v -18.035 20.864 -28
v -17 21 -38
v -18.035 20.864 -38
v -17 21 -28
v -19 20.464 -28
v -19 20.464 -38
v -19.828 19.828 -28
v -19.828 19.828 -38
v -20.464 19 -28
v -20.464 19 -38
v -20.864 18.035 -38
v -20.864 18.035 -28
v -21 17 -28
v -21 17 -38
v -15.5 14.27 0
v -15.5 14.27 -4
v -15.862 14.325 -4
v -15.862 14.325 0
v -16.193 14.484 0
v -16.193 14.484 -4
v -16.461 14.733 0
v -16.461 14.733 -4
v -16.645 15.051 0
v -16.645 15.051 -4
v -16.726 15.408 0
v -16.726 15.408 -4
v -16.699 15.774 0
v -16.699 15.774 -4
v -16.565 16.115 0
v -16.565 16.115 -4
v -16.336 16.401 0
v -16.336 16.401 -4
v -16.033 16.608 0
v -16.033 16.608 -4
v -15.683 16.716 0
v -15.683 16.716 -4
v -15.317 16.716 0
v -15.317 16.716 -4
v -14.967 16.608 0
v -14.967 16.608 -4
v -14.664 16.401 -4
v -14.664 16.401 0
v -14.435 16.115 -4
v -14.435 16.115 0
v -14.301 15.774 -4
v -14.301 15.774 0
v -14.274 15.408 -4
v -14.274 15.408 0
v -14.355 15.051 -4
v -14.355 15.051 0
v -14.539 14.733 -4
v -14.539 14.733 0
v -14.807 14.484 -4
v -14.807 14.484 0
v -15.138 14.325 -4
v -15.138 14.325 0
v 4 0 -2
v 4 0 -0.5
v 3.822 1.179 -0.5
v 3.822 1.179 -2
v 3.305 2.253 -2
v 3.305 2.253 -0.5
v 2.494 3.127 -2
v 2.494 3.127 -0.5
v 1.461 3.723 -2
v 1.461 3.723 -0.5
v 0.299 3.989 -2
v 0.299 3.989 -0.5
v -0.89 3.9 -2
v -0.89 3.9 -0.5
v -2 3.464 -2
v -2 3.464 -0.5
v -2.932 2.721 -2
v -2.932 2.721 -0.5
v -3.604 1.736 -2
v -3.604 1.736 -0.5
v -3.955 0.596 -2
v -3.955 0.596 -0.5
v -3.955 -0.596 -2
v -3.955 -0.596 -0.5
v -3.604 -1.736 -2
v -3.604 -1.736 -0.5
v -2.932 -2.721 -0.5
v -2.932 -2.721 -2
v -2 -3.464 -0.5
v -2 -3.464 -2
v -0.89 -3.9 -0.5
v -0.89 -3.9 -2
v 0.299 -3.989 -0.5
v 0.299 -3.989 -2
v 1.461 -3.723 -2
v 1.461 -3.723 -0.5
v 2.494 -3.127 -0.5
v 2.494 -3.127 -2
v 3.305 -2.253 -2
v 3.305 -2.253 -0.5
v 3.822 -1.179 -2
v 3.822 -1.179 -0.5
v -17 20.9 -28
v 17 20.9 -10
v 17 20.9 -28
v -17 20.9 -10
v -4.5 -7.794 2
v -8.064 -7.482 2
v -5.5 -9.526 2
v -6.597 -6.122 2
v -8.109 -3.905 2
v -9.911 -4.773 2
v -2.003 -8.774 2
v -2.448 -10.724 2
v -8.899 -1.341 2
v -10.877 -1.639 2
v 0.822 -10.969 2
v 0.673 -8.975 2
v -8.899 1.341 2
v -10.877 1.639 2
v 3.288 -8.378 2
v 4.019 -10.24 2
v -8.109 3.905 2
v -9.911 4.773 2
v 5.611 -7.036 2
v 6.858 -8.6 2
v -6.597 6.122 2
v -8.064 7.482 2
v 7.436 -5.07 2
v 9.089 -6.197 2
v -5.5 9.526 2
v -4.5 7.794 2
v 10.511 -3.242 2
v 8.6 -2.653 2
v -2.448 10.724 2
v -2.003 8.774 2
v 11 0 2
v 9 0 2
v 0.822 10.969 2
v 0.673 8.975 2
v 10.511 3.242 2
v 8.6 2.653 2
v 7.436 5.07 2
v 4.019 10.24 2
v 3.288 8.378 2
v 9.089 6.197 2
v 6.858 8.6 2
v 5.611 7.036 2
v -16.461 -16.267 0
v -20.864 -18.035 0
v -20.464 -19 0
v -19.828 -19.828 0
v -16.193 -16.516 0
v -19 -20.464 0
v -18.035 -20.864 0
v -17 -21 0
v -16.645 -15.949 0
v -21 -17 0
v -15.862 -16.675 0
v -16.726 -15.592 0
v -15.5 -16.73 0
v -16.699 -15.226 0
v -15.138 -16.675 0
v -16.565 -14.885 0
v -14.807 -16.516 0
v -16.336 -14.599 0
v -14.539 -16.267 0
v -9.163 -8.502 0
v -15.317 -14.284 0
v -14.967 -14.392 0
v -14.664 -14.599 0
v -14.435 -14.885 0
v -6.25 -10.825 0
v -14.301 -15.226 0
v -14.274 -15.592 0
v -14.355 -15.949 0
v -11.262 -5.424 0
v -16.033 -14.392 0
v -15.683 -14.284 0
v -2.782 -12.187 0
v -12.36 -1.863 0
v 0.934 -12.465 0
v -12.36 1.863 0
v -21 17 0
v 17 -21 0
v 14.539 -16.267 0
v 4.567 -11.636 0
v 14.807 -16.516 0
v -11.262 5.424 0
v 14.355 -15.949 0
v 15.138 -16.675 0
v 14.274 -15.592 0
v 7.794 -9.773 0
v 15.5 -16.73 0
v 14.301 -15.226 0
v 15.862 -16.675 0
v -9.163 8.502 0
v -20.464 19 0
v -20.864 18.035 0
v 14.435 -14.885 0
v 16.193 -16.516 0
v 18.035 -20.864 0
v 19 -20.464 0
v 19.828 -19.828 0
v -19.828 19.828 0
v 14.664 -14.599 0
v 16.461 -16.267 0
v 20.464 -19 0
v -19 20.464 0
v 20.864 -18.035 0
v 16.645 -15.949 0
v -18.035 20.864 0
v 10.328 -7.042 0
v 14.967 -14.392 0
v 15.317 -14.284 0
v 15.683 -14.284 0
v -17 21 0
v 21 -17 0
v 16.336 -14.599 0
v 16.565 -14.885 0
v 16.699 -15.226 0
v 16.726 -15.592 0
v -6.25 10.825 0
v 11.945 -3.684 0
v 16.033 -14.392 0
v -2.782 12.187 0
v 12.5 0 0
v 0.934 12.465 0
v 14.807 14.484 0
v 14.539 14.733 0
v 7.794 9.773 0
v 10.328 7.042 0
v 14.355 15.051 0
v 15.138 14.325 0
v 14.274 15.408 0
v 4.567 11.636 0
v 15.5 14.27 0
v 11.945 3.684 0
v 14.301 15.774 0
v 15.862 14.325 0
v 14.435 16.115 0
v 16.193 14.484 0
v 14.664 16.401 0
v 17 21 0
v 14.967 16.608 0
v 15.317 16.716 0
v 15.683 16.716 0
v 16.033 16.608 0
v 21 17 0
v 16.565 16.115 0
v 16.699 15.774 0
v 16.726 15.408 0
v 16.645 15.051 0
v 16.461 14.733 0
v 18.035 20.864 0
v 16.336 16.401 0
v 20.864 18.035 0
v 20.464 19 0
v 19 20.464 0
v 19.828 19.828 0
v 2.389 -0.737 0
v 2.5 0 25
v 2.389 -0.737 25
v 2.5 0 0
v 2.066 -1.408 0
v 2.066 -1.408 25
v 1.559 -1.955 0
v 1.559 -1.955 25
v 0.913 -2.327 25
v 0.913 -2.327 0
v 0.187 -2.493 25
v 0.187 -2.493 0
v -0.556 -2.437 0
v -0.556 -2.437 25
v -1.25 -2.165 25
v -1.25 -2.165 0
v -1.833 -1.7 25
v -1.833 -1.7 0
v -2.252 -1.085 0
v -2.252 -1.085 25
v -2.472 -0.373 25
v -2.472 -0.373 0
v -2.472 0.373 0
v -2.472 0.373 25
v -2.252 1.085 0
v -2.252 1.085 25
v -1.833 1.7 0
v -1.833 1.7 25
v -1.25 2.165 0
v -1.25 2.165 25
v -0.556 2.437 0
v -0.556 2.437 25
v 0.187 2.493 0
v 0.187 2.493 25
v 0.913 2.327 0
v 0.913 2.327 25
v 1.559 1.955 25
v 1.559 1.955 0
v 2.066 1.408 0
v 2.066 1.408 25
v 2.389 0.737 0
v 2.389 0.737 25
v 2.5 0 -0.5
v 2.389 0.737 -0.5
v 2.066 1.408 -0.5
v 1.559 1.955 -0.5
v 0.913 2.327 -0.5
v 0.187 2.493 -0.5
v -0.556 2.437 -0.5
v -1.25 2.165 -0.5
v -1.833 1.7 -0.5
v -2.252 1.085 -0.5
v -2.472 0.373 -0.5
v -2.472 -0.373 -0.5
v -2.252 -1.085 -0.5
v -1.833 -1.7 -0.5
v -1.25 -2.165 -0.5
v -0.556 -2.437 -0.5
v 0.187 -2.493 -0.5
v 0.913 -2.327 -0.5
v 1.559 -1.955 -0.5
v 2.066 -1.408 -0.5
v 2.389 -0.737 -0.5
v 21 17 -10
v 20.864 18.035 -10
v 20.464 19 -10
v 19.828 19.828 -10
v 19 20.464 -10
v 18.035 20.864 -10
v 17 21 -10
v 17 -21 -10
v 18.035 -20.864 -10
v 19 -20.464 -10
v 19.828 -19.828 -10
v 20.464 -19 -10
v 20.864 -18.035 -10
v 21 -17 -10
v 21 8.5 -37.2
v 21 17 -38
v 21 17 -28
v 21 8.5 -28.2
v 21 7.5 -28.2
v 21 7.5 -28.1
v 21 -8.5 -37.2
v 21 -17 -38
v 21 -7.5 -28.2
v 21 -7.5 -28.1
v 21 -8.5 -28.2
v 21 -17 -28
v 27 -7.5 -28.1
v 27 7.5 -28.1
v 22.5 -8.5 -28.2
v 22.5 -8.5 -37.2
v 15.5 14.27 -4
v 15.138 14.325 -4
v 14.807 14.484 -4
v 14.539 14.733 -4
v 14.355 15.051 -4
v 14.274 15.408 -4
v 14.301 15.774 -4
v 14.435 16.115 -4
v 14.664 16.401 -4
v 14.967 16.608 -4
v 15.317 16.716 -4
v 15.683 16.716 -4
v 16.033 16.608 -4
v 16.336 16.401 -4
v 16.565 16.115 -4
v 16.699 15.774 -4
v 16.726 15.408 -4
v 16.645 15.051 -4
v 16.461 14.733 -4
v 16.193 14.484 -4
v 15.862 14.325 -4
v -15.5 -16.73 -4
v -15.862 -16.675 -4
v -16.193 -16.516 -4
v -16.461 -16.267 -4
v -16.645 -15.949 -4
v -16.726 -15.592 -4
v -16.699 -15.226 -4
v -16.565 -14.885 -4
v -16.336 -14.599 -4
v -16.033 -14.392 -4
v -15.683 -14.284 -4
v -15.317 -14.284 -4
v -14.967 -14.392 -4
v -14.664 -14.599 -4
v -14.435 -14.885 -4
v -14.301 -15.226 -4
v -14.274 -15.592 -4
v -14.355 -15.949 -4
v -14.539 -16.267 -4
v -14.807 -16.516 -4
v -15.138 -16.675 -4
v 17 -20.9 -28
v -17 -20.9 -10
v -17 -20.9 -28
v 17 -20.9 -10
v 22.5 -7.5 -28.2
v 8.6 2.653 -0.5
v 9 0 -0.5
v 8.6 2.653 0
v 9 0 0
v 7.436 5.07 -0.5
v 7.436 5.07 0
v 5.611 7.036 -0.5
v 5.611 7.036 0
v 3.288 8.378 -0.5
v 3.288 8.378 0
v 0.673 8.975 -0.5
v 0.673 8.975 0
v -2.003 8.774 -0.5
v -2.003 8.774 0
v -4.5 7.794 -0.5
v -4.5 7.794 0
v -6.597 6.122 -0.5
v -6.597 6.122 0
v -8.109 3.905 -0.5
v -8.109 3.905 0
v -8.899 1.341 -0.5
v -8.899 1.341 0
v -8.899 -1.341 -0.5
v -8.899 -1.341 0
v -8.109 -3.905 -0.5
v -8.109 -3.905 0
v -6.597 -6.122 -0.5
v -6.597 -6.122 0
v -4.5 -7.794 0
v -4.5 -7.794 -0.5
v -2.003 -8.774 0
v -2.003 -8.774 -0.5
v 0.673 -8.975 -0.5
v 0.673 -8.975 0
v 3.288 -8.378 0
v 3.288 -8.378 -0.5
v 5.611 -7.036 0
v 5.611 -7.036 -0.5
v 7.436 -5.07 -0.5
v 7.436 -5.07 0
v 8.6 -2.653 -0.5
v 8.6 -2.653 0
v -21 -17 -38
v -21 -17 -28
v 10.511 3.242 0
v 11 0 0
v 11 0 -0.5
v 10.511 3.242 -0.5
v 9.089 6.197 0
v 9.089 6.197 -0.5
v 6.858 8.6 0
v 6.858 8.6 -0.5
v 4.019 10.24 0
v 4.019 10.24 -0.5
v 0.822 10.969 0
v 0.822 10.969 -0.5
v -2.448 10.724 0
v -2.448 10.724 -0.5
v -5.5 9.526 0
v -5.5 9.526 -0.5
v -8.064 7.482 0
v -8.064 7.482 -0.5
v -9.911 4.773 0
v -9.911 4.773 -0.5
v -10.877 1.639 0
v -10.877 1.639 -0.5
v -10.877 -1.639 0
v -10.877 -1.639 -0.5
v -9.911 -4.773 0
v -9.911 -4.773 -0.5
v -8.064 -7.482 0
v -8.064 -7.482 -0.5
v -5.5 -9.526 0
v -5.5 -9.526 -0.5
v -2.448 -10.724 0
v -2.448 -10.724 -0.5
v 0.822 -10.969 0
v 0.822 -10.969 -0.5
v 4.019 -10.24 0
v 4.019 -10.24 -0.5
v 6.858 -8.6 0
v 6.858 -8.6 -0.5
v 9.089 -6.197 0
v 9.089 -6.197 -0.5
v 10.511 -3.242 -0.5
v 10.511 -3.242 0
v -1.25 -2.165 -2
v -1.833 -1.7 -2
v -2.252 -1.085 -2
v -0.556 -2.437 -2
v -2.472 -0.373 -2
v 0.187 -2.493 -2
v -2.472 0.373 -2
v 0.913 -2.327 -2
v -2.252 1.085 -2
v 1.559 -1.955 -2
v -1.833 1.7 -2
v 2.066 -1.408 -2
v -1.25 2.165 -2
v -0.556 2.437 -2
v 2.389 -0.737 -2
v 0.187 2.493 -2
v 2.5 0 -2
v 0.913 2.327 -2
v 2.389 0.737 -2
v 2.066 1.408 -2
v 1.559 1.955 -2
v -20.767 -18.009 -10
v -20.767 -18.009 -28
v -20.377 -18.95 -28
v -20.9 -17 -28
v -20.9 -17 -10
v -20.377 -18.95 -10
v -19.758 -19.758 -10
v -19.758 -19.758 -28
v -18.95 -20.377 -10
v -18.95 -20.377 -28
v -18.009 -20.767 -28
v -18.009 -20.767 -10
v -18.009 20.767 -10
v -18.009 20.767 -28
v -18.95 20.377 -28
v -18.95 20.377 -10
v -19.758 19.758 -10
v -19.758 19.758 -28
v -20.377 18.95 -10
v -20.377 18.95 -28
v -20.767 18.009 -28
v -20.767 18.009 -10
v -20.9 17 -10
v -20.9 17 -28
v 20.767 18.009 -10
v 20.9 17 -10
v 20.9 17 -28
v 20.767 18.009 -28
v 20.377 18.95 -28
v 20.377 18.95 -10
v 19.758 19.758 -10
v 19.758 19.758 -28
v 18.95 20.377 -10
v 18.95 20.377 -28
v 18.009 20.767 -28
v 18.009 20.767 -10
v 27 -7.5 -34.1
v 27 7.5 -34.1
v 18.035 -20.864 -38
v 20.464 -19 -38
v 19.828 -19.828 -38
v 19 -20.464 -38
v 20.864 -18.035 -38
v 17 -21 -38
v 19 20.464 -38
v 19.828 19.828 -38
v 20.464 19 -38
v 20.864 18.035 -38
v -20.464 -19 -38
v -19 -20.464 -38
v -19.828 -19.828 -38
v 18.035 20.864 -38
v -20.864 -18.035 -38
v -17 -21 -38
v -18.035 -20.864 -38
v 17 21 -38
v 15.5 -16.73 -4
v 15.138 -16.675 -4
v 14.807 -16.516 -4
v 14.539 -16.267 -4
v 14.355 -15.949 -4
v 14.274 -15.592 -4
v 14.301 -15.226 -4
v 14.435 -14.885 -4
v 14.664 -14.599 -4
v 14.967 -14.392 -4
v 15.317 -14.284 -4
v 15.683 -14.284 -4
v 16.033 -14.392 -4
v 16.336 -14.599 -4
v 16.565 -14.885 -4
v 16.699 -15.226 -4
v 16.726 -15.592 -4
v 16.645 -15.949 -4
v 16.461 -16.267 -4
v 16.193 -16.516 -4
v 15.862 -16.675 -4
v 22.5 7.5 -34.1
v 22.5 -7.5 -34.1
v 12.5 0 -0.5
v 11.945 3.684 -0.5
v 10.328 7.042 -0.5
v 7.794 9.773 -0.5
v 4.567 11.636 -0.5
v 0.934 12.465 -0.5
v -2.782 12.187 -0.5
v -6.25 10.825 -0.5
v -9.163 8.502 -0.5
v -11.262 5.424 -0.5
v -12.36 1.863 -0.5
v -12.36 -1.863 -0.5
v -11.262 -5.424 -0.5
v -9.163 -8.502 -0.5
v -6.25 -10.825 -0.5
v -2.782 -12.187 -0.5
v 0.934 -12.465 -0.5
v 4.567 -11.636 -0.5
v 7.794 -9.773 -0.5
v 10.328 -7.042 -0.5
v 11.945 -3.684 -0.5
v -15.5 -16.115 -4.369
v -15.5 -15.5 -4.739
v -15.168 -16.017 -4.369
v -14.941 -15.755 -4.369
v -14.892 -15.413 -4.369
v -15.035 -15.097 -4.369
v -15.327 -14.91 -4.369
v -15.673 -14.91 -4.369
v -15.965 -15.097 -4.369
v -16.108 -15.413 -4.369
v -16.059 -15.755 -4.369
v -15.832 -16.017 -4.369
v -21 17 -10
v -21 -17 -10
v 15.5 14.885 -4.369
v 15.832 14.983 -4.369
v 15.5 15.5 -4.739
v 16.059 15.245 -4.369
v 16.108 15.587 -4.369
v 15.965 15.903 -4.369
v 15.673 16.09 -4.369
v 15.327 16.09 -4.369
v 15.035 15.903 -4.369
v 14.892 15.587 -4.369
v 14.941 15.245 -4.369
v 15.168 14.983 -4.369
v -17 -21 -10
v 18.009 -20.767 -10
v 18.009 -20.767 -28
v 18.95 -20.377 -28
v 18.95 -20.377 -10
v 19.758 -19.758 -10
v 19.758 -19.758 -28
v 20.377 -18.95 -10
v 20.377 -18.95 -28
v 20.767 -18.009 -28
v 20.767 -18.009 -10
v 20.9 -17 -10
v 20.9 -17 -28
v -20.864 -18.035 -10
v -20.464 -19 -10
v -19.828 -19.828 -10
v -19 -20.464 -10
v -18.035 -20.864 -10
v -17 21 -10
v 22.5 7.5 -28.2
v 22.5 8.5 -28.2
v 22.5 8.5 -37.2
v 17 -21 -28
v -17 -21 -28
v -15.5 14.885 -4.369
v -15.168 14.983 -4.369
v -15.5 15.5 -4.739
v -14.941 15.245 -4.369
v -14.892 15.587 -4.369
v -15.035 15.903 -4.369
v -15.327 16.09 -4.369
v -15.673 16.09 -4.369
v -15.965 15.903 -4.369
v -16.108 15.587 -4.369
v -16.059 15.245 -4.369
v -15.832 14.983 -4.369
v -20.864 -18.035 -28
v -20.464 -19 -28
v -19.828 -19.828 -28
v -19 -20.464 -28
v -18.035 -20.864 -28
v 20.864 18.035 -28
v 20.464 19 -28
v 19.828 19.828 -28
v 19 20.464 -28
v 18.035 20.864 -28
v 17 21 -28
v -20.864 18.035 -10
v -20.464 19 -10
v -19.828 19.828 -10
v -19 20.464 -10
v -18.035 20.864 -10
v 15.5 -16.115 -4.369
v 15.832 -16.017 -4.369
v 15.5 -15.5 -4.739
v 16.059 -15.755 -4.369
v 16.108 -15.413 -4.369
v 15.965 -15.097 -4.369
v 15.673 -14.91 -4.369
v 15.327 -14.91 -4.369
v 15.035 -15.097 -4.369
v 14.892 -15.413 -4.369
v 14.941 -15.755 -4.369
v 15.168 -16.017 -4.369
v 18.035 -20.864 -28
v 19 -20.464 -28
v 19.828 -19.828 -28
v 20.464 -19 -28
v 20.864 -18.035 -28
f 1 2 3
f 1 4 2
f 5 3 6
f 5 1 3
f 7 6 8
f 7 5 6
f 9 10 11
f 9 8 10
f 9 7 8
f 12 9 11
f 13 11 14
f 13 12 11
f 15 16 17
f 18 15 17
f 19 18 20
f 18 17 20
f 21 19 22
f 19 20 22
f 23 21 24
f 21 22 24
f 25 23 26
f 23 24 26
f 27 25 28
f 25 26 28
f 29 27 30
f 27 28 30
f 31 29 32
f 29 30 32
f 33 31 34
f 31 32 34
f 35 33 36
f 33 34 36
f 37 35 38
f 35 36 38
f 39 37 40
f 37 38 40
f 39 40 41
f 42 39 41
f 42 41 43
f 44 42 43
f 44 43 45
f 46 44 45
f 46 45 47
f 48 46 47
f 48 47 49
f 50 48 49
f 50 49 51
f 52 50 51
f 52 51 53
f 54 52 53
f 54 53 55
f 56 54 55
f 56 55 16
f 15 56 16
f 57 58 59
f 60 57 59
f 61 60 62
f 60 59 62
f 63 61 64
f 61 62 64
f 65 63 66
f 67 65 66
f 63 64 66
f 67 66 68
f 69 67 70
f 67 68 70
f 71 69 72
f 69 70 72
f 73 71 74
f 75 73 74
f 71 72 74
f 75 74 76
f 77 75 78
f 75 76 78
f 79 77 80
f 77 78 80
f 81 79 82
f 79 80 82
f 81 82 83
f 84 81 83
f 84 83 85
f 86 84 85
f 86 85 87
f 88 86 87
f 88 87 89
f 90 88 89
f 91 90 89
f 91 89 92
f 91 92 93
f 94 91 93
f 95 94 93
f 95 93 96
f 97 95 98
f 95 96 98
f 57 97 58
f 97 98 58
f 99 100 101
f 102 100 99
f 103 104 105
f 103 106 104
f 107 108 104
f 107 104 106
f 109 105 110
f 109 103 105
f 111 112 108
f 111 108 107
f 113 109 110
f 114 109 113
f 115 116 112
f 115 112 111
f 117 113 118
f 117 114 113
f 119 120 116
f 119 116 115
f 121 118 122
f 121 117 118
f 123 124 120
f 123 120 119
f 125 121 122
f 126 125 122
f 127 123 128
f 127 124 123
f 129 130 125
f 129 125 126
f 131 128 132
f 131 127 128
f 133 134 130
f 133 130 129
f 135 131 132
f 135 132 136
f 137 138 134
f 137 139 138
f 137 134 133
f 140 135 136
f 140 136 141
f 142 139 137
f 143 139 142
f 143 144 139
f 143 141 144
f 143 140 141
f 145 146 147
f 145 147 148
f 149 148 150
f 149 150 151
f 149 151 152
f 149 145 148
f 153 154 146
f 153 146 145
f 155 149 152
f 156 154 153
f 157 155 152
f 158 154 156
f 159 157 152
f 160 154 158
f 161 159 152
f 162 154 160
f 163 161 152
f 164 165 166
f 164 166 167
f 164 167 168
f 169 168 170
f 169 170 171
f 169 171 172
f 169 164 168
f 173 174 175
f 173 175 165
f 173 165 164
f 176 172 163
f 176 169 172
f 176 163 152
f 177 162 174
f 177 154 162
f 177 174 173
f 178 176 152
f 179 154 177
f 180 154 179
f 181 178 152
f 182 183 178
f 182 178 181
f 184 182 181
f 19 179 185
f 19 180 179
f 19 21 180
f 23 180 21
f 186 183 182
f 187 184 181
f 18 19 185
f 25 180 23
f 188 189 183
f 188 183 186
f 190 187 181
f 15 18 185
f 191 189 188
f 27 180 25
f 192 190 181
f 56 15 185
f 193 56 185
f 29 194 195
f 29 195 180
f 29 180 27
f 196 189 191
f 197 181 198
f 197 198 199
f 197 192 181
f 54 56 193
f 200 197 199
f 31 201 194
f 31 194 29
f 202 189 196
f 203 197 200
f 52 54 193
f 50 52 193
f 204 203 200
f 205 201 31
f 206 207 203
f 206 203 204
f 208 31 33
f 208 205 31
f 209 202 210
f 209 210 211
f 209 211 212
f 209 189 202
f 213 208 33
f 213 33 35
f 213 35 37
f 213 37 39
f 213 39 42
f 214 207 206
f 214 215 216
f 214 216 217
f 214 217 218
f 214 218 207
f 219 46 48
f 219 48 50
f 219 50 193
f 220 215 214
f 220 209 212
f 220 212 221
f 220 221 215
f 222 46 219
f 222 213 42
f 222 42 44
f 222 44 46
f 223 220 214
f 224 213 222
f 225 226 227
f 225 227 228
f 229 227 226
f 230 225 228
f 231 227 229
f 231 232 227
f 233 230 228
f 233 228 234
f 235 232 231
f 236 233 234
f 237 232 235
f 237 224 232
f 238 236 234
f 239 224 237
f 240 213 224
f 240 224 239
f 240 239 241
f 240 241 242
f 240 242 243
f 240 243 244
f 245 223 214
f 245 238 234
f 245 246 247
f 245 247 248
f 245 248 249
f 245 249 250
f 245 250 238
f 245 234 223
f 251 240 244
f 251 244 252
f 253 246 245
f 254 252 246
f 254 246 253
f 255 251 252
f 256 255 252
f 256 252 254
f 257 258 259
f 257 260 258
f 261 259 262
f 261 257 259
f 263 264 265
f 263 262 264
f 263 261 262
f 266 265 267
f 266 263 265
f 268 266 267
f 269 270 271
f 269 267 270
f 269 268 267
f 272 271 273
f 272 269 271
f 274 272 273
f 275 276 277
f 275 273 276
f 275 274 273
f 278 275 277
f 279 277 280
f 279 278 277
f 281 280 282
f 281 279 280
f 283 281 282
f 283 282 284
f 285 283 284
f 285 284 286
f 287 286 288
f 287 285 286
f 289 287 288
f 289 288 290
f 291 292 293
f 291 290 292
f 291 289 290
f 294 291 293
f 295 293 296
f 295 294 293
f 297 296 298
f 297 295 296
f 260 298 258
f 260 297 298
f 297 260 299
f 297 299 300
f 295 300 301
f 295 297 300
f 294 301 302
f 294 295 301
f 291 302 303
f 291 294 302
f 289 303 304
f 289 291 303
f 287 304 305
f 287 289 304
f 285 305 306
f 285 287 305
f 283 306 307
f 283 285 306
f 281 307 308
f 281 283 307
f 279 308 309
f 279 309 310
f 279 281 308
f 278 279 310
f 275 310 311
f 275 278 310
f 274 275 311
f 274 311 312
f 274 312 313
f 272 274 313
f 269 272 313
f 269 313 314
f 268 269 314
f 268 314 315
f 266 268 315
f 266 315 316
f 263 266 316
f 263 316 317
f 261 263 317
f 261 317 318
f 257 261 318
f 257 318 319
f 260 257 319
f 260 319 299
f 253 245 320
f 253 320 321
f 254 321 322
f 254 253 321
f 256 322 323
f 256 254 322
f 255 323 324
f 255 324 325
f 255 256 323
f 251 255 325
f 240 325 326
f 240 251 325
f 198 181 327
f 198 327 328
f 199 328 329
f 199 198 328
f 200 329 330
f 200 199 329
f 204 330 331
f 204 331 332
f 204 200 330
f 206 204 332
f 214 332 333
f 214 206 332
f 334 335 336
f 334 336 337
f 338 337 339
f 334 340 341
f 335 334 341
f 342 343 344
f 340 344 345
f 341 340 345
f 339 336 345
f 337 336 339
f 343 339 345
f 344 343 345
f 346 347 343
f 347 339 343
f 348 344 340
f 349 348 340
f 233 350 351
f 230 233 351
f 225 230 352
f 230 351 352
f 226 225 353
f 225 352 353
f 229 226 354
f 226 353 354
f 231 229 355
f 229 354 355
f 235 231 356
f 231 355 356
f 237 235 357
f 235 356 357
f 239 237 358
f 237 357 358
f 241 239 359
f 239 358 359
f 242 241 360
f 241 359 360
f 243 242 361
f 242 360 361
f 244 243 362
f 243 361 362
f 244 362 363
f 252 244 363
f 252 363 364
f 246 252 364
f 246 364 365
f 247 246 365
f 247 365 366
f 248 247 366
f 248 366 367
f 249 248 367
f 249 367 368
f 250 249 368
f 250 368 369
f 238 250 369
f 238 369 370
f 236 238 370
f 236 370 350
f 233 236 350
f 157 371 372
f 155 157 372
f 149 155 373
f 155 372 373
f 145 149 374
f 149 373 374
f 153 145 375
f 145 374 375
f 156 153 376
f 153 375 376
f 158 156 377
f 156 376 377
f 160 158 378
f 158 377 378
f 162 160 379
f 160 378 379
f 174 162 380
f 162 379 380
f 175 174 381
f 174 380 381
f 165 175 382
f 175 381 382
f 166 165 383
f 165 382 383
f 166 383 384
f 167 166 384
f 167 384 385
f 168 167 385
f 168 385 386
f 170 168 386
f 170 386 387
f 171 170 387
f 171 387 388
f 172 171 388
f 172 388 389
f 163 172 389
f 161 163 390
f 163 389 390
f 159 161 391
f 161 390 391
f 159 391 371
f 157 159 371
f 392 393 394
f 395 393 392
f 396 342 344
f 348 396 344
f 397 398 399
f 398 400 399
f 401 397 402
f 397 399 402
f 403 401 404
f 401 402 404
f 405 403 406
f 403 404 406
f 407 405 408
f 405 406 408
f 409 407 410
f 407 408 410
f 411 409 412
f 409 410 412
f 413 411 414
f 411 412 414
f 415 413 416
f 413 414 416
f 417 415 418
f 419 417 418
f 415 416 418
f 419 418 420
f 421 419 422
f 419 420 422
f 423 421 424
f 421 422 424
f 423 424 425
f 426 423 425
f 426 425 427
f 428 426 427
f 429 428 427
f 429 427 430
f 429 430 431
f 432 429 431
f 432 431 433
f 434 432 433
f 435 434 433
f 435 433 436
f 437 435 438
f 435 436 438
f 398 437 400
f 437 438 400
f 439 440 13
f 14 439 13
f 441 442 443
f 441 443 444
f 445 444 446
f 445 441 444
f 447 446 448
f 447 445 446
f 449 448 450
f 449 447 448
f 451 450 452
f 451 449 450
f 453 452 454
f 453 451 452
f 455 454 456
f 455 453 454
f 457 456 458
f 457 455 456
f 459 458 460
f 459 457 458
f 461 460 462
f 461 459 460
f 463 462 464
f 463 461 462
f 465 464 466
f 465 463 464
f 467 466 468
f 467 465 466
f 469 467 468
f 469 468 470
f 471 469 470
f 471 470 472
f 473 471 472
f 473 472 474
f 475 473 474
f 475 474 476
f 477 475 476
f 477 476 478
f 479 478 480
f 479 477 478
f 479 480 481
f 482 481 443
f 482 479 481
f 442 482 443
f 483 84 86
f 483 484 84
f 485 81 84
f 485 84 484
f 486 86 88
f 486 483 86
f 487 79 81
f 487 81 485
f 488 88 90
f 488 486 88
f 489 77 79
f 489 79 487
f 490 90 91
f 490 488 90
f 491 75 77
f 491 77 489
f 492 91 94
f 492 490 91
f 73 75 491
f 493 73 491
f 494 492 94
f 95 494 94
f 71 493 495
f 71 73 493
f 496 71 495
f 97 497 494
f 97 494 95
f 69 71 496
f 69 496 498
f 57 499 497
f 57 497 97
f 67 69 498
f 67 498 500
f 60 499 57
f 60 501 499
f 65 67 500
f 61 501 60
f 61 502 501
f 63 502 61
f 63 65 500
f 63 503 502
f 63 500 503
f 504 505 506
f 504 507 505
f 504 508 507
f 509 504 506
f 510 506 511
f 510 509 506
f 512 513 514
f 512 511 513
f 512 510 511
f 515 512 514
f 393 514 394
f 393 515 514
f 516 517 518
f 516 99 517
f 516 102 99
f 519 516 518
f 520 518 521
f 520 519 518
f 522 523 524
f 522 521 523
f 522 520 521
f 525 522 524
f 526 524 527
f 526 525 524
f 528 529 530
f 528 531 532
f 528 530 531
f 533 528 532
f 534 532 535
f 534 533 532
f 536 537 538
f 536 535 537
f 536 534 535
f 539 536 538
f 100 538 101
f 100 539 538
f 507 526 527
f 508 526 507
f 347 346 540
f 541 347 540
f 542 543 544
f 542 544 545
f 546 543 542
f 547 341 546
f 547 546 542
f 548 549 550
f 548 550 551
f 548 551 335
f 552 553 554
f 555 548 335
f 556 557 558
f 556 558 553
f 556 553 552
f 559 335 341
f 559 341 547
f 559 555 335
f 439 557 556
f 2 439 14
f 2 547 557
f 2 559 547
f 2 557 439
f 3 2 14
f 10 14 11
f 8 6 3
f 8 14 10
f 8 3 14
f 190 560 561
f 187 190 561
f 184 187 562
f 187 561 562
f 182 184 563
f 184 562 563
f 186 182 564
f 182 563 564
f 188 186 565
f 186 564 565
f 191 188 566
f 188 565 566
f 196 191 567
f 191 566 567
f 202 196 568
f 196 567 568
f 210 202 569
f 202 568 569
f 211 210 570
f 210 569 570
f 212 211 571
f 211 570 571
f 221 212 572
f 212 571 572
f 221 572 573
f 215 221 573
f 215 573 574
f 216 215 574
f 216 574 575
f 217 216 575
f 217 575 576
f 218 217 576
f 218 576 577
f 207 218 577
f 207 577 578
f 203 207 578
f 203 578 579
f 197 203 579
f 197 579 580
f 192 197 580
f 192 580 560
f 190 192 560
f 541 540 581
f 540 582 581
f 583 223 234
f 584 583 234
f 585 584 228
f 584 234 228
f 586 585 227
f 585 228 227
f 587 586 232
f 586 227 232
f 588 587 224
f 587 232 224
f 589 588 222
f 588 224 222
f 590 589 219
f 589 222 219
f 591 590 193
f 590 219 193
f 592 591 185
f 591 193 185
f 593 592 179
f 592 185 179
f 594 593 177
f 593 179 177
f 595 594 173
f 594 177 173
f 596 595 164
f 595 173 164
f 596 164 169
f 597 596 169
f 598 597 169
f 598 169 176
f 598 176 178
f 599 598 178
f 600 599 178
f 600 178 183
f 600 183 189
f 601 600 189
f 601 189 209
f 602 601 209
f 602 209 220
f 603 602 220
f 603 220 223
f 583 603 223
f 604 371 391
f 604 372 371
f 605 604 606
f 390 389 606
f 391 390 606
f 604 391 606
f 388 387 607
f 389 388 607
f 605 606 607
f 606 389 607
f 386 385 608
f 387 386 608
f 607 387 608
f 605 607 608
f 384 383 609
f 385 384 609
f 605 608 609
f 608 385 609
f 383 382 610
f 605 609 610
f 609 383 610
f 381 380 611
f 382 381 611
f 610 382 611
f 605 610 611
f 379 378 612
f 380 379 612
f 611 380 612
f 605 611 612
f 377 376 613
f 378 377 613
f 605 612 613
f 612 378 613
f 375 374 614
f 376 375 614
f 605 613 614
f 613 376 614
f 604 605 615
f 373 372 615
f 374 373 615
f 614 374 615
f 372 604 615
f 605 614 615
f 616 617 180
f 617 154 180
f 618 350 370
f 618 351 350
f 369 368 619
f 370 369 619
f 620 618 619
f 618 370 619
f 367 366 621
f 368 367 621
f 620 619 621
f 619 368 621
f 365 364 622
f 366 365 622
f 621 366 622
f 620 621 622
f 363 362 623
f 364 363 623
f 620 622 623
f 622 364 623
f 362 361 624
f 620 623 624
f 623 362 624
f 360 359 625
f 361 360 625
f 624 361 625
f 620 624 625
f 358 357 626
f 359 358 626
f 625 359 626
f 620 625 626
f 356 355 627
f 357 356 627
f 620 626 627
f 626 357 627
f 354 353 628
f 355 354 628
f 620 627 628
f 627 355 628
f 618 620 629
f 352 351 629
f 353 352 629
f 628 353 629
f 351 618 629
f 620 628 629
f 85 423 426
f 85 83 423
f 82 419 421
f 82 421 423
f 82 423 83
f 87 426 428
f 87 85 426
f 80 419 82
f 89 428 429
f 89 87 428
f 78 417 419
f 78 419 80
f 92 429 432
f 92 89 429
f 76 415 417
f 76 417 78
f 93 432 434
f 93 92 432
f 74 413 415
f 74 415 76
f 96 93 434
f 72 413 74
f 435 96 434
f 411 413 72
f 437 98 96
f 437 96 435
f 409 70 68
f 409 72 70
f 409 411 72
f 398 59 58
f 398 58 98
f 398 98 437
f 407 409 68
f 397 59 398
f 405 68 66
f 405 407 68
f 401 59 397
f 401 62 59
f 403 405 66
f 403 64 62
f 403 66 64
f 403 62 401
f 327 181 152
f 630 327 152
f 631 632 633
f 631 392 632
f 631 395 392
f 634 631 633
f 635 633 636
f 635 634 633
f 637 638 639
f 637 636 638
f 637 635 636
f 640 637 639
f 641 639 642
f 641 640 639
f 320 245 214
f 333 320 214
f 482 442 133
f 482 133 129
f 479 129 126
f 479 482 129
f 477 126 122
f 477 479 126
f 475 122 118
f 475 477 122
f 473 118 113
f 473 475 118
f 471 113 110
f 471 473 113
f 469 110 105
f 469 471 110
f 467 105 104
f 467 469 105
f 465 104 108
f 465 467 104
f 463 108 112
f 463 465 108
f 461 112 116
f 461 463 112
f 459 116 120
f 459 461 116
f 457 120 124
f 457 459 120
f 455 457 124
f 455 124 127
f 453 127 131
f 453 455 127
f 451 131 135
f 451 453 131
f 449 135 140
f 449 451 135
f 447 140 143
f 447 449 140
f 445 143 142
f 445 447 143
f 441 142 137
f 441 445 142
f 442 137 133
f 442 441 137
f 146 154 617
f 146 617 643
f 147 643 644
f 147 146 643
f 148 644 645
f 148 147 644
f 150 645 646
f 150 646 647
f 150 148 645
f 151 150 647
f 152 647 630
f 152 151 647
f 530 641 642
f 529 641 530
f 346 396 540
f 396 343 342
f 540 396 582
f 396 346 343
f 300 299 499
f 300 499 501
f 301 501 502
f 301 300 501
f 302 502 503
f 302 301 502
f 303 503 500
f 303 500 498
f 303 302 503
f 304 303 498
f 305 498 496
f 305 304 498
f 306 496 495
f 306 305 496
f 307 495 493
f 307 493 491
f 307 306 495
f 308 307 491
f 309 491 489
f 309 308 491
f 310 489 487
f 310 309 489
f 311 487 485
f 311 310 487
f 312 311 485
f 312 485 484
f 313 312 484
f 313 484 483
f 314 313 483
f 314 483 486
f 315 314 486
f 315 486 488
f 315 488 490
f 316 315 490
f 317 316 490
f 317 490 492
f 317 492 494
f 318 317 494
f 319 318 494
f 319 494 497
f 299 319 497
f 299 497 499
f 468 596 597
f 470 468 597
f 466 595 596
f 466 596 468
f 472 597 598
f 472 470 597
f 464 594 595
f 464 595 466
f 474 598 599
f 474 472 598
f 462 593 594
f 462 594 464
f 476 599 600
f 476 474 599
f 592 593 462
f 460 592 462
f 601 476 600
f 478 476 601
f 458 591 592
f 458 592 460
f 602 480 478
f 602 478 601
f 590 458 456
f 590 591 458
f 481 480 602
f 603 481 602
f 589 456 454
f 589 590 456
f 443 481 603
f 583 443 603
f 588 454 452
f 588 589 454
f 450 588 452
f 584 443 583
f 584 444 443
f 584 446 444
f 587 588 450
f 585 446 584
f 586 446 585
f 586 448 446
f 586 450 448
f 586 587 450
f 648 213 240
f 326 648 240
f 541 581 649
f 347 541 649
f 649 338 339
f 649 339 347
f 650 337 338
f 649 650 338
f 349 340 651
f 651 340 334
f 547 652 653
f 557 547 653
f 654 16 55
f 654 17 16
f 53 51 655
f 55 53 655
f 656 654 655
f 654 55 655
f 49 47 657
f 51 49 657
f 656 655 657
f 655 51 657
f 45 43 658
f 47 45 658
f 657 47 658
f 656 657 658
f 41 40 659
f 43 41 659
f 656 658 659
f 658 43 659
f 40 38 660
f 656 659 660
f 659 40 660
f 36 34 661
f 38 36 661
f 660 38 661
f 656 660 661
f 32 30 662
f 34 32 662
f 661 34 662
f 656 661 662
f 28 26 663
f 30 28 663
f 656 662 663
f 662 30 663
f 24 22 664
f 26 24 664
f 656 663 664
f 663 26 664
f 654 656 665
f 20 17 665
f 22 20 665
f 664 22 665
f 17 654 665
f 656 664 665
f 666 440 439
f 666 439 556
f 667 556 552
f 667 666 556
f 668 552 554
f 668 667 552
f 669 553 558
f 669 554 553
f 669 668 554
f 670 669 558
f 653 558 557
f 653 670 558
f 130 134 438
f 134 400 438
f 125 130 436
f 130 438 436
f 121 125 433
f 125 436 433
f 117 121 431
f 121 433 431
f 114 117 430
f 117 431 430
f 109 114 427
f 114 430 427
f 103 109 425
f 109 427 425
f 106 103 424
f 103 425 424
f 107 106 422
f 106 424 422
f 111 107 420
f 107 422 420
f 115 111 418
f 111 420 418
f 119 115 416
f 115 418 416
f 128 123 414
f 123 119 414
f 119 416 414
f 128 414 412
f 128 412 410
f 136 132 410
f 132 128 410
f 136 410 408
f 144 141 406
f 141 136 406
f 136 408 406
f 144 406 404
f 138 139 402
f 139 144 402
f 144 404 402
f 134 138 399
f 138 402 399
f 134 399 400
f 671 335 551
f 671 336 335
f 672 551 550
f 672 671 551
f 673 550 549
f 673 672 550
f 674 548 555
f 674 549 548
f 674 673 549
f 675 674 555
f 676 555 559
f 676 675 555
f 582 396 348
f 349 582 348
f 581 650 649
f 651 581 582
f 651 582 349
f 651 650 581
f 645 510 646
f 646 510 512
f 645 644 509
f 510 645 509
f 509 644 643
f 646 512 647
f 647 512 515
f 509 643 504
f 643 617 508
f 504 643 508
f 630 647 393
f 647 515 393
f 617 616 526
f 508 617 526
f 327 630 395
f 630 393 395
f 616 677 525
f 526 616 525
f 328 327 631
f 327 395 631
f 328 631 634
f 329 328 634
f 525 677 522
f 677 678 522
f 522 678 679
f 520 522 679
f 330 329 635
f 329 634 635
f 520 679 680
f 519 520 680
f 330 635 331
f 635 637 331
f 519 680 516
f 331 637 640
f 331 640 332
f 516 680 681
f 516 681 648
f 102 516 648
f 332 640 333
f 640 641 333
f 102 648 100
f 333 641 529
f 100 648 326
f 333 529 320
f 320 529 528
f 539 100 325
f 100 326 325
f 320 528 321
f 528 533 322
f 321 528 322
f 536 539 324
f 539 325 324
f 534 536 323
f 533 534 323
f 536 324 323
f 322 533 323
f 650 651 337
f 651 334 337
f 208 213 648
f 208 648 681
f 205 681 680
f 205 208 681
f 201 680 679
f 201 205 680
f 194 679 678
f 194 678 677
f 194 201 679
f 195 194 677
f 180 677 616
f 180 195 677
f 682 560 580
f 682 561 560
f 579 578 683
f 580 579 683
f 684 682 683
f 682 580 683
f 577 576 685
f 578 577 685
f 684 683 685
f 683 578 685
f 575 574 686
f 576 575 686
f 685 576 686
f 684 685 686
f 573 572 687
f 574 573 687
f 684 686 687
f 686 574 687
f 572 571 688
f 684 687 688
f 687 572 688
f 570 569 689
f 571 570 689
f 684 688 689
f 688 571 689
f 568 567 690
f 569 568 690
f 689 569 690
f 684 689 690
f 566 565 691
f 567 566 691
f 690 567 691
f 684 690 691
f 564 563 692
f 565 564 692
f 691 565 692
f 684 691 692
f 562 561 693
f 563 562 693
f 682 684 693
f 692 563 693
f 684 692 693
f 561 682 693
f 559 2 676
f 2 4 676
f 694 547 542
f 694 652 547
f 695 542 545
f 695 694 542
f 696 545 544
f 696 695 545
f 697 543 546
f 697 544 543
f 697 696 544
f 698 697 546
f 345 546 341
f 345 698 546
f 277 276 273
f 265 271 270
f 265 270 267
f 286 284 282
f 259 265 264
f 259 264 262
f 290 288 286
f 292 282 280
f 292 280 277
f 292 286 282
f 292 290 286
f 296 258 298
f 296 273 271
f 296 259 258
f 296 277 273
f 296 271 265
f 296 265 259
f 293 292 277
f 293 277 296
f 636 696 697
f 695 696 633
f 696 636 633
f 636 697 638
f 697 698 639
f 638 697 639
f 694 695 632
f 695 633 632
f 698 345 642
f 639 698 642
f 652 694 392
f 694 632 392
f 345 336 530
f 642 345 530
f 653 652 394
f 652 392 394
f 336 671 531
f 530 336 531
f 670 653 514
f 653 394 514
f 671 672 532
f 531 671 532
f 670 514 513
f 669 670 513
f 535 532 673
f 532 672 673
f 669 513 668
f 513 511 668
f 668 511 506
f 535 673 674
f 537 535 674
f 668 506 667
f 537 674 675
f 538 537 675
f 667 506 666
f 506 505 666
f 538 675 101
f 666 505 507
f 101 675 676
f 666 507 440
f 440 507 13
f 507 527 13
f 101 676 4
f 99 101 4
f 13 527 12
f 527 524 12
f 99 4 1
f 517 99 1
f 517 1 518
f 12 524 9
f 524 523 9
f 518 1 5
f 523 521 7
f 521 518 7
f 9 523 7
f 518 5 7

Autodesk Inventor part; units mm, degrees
ref_plane "YZ Plane" through (0, 0, 0) normal (1, 0, 0) x (0, 1, 0)
sketch "Sketch1" plane through (0, 0, 0) normal (0, 0, 1) x (1, 0, 0)
  circle A0 centre (0, 0) radius 12.5
  circle A1 centre (0, 0) radius 9
  circle A2 centre (0, 0) radius 11
  line L0 (17, -21) -> (-17, -21)
  line L1 (-21, -17) -> (-21, 17)
  line L2 (-17, 21) -> (17, 21)
  line L3 (21, 17) -> (21, -17)
  line L4 (21, -21) -> (-21, 21) construction
  line L5 (-21, -21) -> (21, 21) construction
  arc A3 (-17, 21) -> (-21, 17) centre (-17, 17) ccw
  arc A4 (-21, -17) -> (-17, -21) centre (-17, -17) ccw
  arc A5 (17, -21) -> (21, -17) centre (17, -17) ccw
  arc A6 (21, 17) -> (17, 21) centre (17, 17) ccw
  line L6 (15.5, -15.5) -> (-15.5, -15.5) construction
  line L7 (-15.5, -15.5) -> (-15.5, 15.5) construction
  line L8 (-15.5, 15.5) -> (15.5, 15.5) construction
  line L9 (15.5, 15.5) -> (15.5, -15.5) construction
  line L10 (15.5, -15.5) -> (-15.5, 15.5) construction
  line L11 (-15.5, -15.5) -> (15.5, 15.5) construction
  circle A7 centre (0, 0) radius 2.5
  circle A8 centre (0, 0) radius 4
  dimension "d0" = 42
  dimension "d2" = 42
  dimension "d3" = 4
  dimension "d4" = 18
  dimension "d5" = 22
  dimension "d6" = 25
  dimension "d7" = 31
  dimension "d22" = 5
  dimension "d23" = 8
ref_plane "Work Plane1" through (0, 0, -10) normal (0, 0, 1) x (1, 0, 0)
ref_plane "Work Plane3" through (0, 0, -28) normal (0, 0, 1) x (1, 0, 0)
ref_plane "Work Plane2" through (0, 0, -38) normal (0, 0, 1) x (1, 0, 0)
extrude "Extrusion1" add sketch "Sketch1" against normal up to surface (10 mm away) from surface at 0 contours A0 | A1 | A2 | L0 A4 L1 A3 L2 A6 L3 A5 | A7 | A8
sketch "Sketch2" plane through (17, 21, -10) normal (0, 0, -1) x (-1, 0, 0)
  arc A0 (34, -42) -> (38, -38) centre (34, -38) ccw projected
  line L0 (38, -38) -> (38, -4) projected
  arc A1 (38, -4) -> (34, 0) centre (34, -4) ccw projected
  line L1 (34, 0) -> (0, 0) projected
  arc A2 (0, 0) -> (-4, -4) centre (0, -4) ccw projected
  line L2 (-4, -4) -> (-4, -38) projected
  arc A3 (-4, -38) -> (0, -42) centre (0, -38) ccw projected
  line L3 (0, -42) -> (34, -42) projected
  line L4 (0, -0.1) -> (34, -0.1)
  arc A4 (37.9, -4) -> (34, -0.1) centre (34, -4) ccw
  line L5 (37.9, -4) -> (37.9, -38)
  arc A5 (34, -41.9) -> (37.9, -38) centre (34, -38) ccw
  line L6 (34, -41.9) -> (0, -41.9)
  arc A6 (-3.9, -38) -> (0, -41.9) centre (0, -38) ccw
  line L7 (-3.9, -38) -> (-3.9, -4)
  arc A7 (0, -0.1) -> (-3.9, -4) centre (0, -4) ccw
  point P0 (17, -21)
  dimension "d13" = 0.1
extrude "Extrusion2" add sketch "Sketch2" along normal up to surface (10 mm away) from surface at 18 contours L3 A3 L2 A2 L1 A1 L0 A0 | L4 A4 L5 A5 L6 A6 L7 A7
extrude "Extrusion3" add sketch "Sketch2" along normal up to surface (18 mm away) from surface at 0 contours L4 A4 L5 A5 L6 A6 L7 A7
extrude "Extrusion4" cut sketch "Sketch1" against normal blind 0.5 contours A0 | A1 | A8
extrude "Extrusion5" add sketch "Sketch1" along normal blind 2 contours A2
extrude "Extrusion6" cut sketch "Sketch1" against normal blind 2 contours A8
extrude "Extrusion7" add sketch "Sketch1" along normal blind 25 contours A7
hole "Hole1" at (15.5, 15.5, 0) at (-15.5, 15.5, 0) at (-15.5, -15.5, 0) at (15.5, -15.5, 0) direction (0, 0, -1) diameter 2.459 depth 4 tip angle 118 thread size "M3x0.5" class "6H" standard "ISO Metric profile"
sketch "Sketch3" plane through (21, -17, -38) normal (1, 0, 0) x (0, 0, -1)
  line L0 (0, 34) -> (0, 0) projected
  line L1 (-10, 34) -> (-10, 0) projected
  line L2 (-10, 17) -> (0, 17) construction
  line L3 (-9.9, 9.5) -> (-3.9, 9.5)
  line L4 (-3.9, 9.5) -> (-3.9, 24.5)
  line L5 (-3.9, 24.5) -> (-9.9, 24.5)
  line L6 (-9.9, 24.5) -> (-9.9, 9.5)
  line L7 (-9.9, 9.5) -> (-3.9, 24.5) construction
  line L8 (-3.9, 9.5) -> (-9.9, 24.5) construction
  line L9 (-9.8, 8.5) -> (-0.8, 8.5)
  line L10 (-0.8, 8.5) -> (-0.8, 25.5)
  line L11 (-0.8, 25.5) -> (-9.8, 25.5)
  line L12 (-9.8, 25.5) -> (-9.8, 8.5)
  line L13 (-9.8, 8.5) -> (-0.8, 25.5) construction
  line L14 (-0.8, 8.5) -> (-9.8, 25.5) construction
  point P0 (-38, 17)
  point P1 (-6.9, 17)
  point P2 (-5.3, 17)
  dimension "d35" = 6
  dimension "d36" = 15
  dimension "d37" = 9
  dimension "d38" = 17
  dimension "d39" = 0.1
  dimension "d40" = 0.1
extrude "Extrusion8" add sketch "Sketch3" along normal blind 6 contours L6 L5 L12 L3 | L12 L5 L4 L3
extrude "Extrusion9" add sketch "Sketch3" along normal blind 1.5 contours L12 L5 L4 L3 | L3 L4 L5 L12 L11 L10 L9
equation "\"d9\" = -L"
equation "\"L\" = 38"
properties part number "nema17 33mm"
